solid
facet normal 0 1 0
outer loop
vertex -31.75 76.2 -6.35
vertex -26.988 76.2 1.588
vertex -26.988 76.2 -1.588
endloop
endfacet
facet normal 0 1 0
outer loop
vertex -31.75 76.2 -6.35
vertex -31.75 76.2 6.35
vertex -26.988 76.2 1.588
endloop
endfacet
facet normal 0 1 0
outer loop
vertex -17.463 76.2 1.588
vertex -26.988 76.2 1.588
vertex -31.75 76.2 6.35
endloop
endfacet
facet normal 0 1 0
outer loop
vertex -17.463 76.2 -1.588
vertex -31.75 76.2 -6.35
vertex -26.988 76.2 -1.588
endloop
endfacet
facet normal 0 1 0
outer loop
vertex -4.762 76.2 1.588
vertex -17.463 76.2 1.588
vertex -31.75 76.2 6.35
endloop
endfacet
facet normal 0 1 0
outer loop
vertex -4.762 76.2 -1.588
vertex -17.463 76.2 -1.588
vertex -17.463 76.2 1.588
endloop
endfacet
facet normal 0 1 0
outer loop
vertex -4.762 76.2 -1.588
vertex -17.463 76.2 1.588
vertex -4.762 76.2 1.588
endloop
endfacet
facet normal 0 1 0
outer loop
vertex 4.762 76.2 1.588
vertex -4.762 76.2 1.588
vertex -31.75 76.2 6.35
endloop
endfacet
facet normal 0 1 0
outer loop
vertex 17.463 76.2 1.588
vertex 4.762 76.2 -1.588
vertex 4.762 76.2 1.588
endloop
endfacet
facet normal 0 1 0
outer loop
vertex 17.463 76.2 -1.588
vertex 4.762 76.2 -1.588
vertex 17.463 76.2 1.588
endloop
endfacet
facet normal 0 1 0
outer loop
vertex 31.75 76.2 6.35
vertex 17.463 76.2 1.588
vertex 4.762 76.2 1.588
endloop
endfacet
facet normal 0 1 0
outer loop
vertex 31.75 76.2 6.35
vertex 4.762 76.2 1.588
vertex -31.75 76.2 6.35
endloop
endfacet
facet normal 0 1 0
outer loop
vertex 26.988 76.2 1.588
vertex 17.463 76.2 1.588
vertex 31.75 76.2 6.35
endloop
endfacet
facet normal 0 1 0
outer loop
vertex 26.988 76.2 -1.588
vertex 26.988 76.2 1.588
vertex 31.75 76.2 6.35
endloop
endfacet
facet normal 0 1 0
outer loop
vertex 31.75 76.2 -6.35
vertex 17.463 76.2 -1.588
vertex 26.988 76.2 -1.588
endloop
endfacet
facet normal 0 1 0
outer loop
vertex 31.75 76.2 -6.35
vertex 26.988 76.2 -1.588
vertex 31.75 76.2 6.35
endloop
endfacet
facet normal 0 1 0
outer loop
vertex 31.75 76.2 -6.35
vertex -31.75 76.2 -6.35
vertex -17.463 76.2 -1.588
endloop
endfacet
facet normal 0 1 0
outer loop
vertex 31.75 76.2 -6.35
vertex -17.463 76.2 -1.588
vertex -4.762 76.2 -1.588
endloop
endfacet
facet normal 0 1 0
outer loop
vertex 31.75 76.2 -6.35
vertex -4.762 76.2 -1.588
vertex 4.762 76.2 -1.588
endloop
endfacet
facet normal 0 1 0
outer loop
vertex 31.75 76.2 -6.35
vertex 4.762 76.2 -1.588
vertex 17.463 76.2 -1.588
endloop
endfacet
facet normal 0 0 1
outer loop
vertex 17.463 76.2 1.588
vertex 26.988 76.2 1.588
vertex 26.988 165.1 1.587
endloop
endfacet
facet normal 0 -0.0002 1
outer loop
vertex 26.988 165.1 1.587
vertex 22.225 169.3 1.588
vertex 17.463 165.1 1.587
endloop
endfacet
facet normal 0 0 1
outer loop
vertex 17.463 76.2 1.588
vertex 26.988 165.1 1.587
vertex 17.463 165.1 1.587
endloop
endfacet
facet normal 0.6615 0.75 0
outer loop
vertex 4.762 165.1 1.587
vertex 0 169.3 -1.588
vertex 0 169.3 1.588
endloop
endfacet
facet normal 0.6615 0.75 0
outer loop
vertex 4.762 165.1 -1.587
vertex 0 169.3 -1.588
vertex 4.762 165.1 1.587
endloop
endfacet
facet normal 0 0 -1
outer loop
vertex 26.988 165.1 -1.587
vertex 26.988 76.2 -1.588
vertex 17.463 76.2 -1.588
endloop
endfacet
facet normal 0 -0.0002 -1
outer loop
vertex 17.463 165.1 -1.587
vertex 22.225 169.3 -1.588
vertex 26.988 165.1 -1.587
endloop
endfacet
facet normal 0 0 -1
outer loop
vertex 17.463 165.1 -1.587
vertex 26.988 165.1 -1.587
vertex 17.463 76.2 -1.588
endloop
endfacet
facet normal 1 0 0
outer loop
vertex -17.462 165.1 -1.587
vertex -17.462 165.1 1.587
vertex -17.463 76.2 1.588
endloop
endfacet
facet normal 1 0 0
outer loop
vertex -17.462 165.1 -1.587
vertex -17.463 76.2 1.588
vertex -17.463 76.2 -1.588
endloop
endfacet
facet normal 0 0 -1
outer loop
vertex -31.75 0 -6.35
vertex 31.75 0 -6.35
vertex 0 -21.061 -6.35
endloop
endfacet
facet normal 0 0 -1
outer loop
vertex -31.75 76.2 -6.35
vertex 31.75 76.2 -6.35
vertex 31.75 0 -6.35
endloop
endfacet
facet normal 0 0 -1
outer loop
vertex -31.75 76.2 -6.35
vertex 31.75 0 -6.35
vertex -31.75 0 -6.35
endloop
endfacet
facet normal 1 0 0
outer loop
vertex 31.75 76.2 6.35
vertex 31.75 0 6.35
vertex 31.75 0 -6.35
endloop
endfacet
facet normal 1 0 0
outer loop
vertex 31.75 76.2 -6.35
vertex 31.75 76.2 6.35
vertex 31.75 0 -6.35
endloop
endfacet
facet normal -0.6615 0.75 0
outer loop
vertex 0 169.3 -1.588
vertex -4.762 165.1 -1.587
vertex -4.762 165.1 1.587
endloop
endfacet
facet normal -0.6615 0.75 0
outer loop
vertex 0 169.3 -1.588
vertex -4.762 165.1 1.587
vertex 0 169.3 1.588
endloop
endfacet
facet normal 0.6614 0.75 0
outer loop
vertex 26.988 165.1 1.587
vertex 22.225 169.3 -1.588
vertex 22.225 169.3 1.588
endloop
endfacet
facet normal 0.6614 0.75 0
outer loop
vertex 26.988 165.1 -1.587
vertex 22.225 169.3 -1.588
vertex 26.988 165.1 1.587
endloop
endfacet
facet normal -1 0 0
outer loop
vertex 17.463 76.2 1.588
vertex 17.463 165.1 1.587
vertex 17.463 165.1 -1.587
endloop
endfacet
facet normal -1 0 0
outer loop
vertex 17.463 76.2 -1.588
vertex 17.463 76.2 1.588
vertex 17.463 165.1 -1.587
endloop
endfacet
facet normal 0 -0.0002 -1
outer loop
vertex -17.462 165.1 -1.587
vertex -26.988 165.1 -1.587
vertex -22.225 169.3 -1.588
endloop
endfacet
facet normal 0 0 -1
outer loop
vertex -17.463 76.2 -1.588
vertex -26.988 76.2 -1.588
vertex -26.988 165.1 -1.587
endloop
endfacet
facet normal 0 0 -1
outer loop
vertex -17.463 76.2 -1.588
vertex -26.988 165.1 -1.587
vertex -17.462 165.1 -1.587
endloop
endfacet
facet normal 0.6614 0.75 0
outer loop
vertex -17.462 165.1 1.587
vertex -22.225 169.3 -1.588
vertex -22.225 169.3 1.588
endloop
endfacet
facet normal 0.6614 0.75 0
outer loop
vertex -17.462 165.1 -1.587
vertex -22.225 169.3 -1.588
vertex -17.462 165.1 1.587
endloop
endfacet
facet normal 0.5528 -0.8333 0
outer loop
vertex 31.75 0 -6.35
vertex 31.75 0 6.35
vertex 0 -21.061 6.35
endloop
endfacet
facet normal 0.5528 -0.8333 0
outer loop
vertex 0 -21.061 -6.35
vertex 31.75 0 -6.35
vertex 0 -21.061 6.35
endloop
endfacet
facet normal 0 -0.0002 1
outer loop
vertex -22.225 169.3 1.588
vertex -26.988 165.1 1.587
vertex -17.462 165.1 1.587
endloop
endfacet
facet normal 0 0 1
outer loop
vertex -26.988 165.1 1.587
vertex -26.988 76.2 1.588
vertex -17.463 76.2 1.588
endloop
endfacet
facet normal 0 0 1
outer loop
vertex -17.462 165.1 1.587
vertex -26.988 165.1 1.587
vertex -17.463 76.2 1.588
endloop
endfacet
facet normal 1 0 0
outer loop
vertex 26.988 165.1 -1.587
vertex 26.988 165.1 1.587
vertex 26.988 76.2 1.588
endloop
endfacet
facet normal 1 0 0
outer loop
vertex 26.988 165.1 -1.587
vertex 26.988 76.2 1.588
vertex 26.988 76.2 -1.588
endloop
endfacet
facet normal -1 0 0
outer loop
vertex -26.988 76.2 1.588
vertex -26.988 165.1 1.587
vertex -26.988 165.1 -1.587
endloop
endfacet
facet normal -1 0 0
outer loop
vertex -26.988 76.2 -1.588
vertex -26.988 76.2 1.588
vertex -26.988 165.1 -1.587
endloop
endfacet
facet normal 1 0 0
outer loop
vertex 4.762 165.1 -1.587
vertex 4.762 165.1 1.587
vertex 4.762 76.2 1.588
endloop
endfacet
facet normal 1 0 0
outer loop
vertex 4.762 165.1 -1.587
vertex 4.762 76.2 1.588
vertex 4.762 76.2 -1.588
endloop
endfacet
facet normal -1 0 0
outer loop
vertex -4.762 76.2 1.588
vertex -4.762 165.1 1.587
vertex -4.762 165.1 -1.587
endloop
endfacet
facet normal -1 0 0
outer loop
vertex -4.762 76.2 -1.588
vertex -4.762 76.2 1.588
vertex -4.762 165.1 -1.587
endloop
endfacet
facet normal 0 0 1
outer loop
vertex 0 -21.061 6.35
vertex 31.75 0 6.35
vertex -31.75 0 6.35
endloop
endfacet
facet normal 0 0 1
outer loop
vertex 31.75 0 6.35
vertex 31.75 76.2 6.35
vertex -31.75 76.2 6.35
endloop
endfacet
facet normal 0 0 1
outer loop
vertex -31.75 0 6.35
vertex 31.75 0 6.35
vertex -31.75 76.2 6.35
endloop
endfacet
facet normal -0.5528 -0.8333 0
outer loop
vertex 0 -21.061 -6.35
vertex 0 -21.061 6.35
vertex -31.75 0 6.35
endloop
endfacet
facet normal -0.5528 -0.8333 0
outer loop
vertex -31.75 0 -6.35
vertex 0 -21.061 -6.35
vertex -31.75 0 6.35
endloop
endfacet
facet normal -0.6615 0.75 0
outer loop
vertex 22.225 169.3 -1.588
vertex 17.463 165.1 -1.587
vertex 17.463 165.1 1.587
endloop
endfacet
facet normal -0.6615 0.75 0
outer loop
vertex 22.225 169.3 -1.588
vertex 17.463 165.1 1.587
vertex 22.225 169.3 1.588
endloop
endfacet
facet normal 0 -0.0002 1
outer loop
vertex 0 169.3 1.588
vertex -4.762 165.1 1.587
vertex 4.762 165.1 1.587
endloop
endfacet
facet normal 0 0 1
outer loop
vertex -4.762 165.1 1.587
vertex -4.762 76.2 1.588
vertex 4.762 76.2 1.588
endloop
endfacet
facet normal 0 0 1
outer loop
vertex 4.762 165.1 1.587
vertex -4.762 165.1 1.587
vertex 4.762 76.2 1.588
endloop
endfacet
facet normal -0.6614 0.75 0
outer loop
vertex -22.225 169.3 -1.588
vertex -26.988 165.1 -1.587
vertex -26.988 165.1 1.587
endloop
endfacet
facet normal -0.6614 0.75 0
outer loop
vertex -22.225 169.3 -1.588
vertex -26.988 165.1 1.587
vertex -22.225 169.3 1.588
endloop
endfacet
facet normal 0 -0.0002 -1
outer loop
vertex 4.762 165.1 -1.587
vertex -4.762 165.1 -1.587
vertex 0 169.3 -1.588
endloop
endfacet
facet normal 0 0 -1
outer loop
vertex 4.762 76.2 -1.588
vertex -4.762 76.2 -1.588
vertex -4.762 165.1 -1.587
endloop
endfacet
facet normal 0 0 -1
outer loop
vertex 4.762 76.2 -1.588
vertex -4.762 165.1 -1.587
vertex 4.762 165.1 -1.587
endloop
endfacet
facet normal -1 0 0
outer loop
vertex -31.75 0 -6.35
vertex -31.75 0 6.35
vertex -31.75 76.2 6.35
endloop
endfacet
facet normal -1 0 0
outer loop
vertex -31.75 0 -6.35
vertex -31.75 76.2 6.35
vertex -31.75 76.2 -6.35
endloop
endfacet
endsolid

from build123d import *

# Parameters (mm, degrees)
SKETCH1_W           = 63.5
SKETCH1_H           = 12.7
BOSS_EXTRUDE1_DEPTH = 76.2
SKETCH2_W           = 9.525
SKETCH2_H           = 3.175
BOSS_EXTRUDE2_DEPTH = 88.9
BOSS_EXTRUDE3_DEPTH = 3.175
BOSS_EXTRUDE4_DEPTH = 12.7


with BuildPart() as part:
    # Sketch1 → Boss-Extrude1 (new body)
    with BuildSketch(Plane(origin=(0, 0, 0), x_dir=(1, 0, 0), z_dir=(0, 1, 0))):
        Rectangle(SKETCH1_W, SKETCH1_H)
    extrude(amount=BOSS_EXTRUDE1_DEPTH)

    # Sketch2 → Boss-Extrude2 (add)
    with BuildSketch(Plane(origin=(0, 76.2, 0), x_dir=(1, 0, 0), z_dir=(0, 1, 0))):
        Rectangle(SKETCH2_W, SKETCH2_H)
        with Locations((-22.225, 0)):
            Rectangle(SKETCH2_W, SKETCH2_H)
        with Locations((22.225, 0)):
            Rectangle(SKETCH2_W, SKETCH2_H)
    extrude(amount=BOSS_EXTRUDE2_DEPTH)

    # Sketch3 → Boss-Extrude3 (add)
    with BuildSketch(Plane(origin=(0, 0, -1.5875), x_dir=(-1, 0, 0), z_dir=(0, 0, -1))):
        Polygon((-26.9875, 165.1), (-17.4625, 165.1), (-22.225, 169.300130206), align=None)
        Polygon((-4.7625, 165.1), (4.7625, 165.1), (0, 169.300130206), align=None)
        Polygon((17.4625, 165.1), (26.9875, 165.1), (22.225, 169.300130206), align=None)
    extrude(amount=-BOSS_EXTRUDE3_DEPTH)

    # Sketch4 → Boss-Extrude4 (add)
    with BuildSketch(Plane.XY.offset(6.35)):
        Polygon((31.75, 0), (0, -21.060567419), (-31.75, 0), align=None)
    extrude(amount=-BOSS_EXTRUDE4_DEPTH)


solid = part.part
